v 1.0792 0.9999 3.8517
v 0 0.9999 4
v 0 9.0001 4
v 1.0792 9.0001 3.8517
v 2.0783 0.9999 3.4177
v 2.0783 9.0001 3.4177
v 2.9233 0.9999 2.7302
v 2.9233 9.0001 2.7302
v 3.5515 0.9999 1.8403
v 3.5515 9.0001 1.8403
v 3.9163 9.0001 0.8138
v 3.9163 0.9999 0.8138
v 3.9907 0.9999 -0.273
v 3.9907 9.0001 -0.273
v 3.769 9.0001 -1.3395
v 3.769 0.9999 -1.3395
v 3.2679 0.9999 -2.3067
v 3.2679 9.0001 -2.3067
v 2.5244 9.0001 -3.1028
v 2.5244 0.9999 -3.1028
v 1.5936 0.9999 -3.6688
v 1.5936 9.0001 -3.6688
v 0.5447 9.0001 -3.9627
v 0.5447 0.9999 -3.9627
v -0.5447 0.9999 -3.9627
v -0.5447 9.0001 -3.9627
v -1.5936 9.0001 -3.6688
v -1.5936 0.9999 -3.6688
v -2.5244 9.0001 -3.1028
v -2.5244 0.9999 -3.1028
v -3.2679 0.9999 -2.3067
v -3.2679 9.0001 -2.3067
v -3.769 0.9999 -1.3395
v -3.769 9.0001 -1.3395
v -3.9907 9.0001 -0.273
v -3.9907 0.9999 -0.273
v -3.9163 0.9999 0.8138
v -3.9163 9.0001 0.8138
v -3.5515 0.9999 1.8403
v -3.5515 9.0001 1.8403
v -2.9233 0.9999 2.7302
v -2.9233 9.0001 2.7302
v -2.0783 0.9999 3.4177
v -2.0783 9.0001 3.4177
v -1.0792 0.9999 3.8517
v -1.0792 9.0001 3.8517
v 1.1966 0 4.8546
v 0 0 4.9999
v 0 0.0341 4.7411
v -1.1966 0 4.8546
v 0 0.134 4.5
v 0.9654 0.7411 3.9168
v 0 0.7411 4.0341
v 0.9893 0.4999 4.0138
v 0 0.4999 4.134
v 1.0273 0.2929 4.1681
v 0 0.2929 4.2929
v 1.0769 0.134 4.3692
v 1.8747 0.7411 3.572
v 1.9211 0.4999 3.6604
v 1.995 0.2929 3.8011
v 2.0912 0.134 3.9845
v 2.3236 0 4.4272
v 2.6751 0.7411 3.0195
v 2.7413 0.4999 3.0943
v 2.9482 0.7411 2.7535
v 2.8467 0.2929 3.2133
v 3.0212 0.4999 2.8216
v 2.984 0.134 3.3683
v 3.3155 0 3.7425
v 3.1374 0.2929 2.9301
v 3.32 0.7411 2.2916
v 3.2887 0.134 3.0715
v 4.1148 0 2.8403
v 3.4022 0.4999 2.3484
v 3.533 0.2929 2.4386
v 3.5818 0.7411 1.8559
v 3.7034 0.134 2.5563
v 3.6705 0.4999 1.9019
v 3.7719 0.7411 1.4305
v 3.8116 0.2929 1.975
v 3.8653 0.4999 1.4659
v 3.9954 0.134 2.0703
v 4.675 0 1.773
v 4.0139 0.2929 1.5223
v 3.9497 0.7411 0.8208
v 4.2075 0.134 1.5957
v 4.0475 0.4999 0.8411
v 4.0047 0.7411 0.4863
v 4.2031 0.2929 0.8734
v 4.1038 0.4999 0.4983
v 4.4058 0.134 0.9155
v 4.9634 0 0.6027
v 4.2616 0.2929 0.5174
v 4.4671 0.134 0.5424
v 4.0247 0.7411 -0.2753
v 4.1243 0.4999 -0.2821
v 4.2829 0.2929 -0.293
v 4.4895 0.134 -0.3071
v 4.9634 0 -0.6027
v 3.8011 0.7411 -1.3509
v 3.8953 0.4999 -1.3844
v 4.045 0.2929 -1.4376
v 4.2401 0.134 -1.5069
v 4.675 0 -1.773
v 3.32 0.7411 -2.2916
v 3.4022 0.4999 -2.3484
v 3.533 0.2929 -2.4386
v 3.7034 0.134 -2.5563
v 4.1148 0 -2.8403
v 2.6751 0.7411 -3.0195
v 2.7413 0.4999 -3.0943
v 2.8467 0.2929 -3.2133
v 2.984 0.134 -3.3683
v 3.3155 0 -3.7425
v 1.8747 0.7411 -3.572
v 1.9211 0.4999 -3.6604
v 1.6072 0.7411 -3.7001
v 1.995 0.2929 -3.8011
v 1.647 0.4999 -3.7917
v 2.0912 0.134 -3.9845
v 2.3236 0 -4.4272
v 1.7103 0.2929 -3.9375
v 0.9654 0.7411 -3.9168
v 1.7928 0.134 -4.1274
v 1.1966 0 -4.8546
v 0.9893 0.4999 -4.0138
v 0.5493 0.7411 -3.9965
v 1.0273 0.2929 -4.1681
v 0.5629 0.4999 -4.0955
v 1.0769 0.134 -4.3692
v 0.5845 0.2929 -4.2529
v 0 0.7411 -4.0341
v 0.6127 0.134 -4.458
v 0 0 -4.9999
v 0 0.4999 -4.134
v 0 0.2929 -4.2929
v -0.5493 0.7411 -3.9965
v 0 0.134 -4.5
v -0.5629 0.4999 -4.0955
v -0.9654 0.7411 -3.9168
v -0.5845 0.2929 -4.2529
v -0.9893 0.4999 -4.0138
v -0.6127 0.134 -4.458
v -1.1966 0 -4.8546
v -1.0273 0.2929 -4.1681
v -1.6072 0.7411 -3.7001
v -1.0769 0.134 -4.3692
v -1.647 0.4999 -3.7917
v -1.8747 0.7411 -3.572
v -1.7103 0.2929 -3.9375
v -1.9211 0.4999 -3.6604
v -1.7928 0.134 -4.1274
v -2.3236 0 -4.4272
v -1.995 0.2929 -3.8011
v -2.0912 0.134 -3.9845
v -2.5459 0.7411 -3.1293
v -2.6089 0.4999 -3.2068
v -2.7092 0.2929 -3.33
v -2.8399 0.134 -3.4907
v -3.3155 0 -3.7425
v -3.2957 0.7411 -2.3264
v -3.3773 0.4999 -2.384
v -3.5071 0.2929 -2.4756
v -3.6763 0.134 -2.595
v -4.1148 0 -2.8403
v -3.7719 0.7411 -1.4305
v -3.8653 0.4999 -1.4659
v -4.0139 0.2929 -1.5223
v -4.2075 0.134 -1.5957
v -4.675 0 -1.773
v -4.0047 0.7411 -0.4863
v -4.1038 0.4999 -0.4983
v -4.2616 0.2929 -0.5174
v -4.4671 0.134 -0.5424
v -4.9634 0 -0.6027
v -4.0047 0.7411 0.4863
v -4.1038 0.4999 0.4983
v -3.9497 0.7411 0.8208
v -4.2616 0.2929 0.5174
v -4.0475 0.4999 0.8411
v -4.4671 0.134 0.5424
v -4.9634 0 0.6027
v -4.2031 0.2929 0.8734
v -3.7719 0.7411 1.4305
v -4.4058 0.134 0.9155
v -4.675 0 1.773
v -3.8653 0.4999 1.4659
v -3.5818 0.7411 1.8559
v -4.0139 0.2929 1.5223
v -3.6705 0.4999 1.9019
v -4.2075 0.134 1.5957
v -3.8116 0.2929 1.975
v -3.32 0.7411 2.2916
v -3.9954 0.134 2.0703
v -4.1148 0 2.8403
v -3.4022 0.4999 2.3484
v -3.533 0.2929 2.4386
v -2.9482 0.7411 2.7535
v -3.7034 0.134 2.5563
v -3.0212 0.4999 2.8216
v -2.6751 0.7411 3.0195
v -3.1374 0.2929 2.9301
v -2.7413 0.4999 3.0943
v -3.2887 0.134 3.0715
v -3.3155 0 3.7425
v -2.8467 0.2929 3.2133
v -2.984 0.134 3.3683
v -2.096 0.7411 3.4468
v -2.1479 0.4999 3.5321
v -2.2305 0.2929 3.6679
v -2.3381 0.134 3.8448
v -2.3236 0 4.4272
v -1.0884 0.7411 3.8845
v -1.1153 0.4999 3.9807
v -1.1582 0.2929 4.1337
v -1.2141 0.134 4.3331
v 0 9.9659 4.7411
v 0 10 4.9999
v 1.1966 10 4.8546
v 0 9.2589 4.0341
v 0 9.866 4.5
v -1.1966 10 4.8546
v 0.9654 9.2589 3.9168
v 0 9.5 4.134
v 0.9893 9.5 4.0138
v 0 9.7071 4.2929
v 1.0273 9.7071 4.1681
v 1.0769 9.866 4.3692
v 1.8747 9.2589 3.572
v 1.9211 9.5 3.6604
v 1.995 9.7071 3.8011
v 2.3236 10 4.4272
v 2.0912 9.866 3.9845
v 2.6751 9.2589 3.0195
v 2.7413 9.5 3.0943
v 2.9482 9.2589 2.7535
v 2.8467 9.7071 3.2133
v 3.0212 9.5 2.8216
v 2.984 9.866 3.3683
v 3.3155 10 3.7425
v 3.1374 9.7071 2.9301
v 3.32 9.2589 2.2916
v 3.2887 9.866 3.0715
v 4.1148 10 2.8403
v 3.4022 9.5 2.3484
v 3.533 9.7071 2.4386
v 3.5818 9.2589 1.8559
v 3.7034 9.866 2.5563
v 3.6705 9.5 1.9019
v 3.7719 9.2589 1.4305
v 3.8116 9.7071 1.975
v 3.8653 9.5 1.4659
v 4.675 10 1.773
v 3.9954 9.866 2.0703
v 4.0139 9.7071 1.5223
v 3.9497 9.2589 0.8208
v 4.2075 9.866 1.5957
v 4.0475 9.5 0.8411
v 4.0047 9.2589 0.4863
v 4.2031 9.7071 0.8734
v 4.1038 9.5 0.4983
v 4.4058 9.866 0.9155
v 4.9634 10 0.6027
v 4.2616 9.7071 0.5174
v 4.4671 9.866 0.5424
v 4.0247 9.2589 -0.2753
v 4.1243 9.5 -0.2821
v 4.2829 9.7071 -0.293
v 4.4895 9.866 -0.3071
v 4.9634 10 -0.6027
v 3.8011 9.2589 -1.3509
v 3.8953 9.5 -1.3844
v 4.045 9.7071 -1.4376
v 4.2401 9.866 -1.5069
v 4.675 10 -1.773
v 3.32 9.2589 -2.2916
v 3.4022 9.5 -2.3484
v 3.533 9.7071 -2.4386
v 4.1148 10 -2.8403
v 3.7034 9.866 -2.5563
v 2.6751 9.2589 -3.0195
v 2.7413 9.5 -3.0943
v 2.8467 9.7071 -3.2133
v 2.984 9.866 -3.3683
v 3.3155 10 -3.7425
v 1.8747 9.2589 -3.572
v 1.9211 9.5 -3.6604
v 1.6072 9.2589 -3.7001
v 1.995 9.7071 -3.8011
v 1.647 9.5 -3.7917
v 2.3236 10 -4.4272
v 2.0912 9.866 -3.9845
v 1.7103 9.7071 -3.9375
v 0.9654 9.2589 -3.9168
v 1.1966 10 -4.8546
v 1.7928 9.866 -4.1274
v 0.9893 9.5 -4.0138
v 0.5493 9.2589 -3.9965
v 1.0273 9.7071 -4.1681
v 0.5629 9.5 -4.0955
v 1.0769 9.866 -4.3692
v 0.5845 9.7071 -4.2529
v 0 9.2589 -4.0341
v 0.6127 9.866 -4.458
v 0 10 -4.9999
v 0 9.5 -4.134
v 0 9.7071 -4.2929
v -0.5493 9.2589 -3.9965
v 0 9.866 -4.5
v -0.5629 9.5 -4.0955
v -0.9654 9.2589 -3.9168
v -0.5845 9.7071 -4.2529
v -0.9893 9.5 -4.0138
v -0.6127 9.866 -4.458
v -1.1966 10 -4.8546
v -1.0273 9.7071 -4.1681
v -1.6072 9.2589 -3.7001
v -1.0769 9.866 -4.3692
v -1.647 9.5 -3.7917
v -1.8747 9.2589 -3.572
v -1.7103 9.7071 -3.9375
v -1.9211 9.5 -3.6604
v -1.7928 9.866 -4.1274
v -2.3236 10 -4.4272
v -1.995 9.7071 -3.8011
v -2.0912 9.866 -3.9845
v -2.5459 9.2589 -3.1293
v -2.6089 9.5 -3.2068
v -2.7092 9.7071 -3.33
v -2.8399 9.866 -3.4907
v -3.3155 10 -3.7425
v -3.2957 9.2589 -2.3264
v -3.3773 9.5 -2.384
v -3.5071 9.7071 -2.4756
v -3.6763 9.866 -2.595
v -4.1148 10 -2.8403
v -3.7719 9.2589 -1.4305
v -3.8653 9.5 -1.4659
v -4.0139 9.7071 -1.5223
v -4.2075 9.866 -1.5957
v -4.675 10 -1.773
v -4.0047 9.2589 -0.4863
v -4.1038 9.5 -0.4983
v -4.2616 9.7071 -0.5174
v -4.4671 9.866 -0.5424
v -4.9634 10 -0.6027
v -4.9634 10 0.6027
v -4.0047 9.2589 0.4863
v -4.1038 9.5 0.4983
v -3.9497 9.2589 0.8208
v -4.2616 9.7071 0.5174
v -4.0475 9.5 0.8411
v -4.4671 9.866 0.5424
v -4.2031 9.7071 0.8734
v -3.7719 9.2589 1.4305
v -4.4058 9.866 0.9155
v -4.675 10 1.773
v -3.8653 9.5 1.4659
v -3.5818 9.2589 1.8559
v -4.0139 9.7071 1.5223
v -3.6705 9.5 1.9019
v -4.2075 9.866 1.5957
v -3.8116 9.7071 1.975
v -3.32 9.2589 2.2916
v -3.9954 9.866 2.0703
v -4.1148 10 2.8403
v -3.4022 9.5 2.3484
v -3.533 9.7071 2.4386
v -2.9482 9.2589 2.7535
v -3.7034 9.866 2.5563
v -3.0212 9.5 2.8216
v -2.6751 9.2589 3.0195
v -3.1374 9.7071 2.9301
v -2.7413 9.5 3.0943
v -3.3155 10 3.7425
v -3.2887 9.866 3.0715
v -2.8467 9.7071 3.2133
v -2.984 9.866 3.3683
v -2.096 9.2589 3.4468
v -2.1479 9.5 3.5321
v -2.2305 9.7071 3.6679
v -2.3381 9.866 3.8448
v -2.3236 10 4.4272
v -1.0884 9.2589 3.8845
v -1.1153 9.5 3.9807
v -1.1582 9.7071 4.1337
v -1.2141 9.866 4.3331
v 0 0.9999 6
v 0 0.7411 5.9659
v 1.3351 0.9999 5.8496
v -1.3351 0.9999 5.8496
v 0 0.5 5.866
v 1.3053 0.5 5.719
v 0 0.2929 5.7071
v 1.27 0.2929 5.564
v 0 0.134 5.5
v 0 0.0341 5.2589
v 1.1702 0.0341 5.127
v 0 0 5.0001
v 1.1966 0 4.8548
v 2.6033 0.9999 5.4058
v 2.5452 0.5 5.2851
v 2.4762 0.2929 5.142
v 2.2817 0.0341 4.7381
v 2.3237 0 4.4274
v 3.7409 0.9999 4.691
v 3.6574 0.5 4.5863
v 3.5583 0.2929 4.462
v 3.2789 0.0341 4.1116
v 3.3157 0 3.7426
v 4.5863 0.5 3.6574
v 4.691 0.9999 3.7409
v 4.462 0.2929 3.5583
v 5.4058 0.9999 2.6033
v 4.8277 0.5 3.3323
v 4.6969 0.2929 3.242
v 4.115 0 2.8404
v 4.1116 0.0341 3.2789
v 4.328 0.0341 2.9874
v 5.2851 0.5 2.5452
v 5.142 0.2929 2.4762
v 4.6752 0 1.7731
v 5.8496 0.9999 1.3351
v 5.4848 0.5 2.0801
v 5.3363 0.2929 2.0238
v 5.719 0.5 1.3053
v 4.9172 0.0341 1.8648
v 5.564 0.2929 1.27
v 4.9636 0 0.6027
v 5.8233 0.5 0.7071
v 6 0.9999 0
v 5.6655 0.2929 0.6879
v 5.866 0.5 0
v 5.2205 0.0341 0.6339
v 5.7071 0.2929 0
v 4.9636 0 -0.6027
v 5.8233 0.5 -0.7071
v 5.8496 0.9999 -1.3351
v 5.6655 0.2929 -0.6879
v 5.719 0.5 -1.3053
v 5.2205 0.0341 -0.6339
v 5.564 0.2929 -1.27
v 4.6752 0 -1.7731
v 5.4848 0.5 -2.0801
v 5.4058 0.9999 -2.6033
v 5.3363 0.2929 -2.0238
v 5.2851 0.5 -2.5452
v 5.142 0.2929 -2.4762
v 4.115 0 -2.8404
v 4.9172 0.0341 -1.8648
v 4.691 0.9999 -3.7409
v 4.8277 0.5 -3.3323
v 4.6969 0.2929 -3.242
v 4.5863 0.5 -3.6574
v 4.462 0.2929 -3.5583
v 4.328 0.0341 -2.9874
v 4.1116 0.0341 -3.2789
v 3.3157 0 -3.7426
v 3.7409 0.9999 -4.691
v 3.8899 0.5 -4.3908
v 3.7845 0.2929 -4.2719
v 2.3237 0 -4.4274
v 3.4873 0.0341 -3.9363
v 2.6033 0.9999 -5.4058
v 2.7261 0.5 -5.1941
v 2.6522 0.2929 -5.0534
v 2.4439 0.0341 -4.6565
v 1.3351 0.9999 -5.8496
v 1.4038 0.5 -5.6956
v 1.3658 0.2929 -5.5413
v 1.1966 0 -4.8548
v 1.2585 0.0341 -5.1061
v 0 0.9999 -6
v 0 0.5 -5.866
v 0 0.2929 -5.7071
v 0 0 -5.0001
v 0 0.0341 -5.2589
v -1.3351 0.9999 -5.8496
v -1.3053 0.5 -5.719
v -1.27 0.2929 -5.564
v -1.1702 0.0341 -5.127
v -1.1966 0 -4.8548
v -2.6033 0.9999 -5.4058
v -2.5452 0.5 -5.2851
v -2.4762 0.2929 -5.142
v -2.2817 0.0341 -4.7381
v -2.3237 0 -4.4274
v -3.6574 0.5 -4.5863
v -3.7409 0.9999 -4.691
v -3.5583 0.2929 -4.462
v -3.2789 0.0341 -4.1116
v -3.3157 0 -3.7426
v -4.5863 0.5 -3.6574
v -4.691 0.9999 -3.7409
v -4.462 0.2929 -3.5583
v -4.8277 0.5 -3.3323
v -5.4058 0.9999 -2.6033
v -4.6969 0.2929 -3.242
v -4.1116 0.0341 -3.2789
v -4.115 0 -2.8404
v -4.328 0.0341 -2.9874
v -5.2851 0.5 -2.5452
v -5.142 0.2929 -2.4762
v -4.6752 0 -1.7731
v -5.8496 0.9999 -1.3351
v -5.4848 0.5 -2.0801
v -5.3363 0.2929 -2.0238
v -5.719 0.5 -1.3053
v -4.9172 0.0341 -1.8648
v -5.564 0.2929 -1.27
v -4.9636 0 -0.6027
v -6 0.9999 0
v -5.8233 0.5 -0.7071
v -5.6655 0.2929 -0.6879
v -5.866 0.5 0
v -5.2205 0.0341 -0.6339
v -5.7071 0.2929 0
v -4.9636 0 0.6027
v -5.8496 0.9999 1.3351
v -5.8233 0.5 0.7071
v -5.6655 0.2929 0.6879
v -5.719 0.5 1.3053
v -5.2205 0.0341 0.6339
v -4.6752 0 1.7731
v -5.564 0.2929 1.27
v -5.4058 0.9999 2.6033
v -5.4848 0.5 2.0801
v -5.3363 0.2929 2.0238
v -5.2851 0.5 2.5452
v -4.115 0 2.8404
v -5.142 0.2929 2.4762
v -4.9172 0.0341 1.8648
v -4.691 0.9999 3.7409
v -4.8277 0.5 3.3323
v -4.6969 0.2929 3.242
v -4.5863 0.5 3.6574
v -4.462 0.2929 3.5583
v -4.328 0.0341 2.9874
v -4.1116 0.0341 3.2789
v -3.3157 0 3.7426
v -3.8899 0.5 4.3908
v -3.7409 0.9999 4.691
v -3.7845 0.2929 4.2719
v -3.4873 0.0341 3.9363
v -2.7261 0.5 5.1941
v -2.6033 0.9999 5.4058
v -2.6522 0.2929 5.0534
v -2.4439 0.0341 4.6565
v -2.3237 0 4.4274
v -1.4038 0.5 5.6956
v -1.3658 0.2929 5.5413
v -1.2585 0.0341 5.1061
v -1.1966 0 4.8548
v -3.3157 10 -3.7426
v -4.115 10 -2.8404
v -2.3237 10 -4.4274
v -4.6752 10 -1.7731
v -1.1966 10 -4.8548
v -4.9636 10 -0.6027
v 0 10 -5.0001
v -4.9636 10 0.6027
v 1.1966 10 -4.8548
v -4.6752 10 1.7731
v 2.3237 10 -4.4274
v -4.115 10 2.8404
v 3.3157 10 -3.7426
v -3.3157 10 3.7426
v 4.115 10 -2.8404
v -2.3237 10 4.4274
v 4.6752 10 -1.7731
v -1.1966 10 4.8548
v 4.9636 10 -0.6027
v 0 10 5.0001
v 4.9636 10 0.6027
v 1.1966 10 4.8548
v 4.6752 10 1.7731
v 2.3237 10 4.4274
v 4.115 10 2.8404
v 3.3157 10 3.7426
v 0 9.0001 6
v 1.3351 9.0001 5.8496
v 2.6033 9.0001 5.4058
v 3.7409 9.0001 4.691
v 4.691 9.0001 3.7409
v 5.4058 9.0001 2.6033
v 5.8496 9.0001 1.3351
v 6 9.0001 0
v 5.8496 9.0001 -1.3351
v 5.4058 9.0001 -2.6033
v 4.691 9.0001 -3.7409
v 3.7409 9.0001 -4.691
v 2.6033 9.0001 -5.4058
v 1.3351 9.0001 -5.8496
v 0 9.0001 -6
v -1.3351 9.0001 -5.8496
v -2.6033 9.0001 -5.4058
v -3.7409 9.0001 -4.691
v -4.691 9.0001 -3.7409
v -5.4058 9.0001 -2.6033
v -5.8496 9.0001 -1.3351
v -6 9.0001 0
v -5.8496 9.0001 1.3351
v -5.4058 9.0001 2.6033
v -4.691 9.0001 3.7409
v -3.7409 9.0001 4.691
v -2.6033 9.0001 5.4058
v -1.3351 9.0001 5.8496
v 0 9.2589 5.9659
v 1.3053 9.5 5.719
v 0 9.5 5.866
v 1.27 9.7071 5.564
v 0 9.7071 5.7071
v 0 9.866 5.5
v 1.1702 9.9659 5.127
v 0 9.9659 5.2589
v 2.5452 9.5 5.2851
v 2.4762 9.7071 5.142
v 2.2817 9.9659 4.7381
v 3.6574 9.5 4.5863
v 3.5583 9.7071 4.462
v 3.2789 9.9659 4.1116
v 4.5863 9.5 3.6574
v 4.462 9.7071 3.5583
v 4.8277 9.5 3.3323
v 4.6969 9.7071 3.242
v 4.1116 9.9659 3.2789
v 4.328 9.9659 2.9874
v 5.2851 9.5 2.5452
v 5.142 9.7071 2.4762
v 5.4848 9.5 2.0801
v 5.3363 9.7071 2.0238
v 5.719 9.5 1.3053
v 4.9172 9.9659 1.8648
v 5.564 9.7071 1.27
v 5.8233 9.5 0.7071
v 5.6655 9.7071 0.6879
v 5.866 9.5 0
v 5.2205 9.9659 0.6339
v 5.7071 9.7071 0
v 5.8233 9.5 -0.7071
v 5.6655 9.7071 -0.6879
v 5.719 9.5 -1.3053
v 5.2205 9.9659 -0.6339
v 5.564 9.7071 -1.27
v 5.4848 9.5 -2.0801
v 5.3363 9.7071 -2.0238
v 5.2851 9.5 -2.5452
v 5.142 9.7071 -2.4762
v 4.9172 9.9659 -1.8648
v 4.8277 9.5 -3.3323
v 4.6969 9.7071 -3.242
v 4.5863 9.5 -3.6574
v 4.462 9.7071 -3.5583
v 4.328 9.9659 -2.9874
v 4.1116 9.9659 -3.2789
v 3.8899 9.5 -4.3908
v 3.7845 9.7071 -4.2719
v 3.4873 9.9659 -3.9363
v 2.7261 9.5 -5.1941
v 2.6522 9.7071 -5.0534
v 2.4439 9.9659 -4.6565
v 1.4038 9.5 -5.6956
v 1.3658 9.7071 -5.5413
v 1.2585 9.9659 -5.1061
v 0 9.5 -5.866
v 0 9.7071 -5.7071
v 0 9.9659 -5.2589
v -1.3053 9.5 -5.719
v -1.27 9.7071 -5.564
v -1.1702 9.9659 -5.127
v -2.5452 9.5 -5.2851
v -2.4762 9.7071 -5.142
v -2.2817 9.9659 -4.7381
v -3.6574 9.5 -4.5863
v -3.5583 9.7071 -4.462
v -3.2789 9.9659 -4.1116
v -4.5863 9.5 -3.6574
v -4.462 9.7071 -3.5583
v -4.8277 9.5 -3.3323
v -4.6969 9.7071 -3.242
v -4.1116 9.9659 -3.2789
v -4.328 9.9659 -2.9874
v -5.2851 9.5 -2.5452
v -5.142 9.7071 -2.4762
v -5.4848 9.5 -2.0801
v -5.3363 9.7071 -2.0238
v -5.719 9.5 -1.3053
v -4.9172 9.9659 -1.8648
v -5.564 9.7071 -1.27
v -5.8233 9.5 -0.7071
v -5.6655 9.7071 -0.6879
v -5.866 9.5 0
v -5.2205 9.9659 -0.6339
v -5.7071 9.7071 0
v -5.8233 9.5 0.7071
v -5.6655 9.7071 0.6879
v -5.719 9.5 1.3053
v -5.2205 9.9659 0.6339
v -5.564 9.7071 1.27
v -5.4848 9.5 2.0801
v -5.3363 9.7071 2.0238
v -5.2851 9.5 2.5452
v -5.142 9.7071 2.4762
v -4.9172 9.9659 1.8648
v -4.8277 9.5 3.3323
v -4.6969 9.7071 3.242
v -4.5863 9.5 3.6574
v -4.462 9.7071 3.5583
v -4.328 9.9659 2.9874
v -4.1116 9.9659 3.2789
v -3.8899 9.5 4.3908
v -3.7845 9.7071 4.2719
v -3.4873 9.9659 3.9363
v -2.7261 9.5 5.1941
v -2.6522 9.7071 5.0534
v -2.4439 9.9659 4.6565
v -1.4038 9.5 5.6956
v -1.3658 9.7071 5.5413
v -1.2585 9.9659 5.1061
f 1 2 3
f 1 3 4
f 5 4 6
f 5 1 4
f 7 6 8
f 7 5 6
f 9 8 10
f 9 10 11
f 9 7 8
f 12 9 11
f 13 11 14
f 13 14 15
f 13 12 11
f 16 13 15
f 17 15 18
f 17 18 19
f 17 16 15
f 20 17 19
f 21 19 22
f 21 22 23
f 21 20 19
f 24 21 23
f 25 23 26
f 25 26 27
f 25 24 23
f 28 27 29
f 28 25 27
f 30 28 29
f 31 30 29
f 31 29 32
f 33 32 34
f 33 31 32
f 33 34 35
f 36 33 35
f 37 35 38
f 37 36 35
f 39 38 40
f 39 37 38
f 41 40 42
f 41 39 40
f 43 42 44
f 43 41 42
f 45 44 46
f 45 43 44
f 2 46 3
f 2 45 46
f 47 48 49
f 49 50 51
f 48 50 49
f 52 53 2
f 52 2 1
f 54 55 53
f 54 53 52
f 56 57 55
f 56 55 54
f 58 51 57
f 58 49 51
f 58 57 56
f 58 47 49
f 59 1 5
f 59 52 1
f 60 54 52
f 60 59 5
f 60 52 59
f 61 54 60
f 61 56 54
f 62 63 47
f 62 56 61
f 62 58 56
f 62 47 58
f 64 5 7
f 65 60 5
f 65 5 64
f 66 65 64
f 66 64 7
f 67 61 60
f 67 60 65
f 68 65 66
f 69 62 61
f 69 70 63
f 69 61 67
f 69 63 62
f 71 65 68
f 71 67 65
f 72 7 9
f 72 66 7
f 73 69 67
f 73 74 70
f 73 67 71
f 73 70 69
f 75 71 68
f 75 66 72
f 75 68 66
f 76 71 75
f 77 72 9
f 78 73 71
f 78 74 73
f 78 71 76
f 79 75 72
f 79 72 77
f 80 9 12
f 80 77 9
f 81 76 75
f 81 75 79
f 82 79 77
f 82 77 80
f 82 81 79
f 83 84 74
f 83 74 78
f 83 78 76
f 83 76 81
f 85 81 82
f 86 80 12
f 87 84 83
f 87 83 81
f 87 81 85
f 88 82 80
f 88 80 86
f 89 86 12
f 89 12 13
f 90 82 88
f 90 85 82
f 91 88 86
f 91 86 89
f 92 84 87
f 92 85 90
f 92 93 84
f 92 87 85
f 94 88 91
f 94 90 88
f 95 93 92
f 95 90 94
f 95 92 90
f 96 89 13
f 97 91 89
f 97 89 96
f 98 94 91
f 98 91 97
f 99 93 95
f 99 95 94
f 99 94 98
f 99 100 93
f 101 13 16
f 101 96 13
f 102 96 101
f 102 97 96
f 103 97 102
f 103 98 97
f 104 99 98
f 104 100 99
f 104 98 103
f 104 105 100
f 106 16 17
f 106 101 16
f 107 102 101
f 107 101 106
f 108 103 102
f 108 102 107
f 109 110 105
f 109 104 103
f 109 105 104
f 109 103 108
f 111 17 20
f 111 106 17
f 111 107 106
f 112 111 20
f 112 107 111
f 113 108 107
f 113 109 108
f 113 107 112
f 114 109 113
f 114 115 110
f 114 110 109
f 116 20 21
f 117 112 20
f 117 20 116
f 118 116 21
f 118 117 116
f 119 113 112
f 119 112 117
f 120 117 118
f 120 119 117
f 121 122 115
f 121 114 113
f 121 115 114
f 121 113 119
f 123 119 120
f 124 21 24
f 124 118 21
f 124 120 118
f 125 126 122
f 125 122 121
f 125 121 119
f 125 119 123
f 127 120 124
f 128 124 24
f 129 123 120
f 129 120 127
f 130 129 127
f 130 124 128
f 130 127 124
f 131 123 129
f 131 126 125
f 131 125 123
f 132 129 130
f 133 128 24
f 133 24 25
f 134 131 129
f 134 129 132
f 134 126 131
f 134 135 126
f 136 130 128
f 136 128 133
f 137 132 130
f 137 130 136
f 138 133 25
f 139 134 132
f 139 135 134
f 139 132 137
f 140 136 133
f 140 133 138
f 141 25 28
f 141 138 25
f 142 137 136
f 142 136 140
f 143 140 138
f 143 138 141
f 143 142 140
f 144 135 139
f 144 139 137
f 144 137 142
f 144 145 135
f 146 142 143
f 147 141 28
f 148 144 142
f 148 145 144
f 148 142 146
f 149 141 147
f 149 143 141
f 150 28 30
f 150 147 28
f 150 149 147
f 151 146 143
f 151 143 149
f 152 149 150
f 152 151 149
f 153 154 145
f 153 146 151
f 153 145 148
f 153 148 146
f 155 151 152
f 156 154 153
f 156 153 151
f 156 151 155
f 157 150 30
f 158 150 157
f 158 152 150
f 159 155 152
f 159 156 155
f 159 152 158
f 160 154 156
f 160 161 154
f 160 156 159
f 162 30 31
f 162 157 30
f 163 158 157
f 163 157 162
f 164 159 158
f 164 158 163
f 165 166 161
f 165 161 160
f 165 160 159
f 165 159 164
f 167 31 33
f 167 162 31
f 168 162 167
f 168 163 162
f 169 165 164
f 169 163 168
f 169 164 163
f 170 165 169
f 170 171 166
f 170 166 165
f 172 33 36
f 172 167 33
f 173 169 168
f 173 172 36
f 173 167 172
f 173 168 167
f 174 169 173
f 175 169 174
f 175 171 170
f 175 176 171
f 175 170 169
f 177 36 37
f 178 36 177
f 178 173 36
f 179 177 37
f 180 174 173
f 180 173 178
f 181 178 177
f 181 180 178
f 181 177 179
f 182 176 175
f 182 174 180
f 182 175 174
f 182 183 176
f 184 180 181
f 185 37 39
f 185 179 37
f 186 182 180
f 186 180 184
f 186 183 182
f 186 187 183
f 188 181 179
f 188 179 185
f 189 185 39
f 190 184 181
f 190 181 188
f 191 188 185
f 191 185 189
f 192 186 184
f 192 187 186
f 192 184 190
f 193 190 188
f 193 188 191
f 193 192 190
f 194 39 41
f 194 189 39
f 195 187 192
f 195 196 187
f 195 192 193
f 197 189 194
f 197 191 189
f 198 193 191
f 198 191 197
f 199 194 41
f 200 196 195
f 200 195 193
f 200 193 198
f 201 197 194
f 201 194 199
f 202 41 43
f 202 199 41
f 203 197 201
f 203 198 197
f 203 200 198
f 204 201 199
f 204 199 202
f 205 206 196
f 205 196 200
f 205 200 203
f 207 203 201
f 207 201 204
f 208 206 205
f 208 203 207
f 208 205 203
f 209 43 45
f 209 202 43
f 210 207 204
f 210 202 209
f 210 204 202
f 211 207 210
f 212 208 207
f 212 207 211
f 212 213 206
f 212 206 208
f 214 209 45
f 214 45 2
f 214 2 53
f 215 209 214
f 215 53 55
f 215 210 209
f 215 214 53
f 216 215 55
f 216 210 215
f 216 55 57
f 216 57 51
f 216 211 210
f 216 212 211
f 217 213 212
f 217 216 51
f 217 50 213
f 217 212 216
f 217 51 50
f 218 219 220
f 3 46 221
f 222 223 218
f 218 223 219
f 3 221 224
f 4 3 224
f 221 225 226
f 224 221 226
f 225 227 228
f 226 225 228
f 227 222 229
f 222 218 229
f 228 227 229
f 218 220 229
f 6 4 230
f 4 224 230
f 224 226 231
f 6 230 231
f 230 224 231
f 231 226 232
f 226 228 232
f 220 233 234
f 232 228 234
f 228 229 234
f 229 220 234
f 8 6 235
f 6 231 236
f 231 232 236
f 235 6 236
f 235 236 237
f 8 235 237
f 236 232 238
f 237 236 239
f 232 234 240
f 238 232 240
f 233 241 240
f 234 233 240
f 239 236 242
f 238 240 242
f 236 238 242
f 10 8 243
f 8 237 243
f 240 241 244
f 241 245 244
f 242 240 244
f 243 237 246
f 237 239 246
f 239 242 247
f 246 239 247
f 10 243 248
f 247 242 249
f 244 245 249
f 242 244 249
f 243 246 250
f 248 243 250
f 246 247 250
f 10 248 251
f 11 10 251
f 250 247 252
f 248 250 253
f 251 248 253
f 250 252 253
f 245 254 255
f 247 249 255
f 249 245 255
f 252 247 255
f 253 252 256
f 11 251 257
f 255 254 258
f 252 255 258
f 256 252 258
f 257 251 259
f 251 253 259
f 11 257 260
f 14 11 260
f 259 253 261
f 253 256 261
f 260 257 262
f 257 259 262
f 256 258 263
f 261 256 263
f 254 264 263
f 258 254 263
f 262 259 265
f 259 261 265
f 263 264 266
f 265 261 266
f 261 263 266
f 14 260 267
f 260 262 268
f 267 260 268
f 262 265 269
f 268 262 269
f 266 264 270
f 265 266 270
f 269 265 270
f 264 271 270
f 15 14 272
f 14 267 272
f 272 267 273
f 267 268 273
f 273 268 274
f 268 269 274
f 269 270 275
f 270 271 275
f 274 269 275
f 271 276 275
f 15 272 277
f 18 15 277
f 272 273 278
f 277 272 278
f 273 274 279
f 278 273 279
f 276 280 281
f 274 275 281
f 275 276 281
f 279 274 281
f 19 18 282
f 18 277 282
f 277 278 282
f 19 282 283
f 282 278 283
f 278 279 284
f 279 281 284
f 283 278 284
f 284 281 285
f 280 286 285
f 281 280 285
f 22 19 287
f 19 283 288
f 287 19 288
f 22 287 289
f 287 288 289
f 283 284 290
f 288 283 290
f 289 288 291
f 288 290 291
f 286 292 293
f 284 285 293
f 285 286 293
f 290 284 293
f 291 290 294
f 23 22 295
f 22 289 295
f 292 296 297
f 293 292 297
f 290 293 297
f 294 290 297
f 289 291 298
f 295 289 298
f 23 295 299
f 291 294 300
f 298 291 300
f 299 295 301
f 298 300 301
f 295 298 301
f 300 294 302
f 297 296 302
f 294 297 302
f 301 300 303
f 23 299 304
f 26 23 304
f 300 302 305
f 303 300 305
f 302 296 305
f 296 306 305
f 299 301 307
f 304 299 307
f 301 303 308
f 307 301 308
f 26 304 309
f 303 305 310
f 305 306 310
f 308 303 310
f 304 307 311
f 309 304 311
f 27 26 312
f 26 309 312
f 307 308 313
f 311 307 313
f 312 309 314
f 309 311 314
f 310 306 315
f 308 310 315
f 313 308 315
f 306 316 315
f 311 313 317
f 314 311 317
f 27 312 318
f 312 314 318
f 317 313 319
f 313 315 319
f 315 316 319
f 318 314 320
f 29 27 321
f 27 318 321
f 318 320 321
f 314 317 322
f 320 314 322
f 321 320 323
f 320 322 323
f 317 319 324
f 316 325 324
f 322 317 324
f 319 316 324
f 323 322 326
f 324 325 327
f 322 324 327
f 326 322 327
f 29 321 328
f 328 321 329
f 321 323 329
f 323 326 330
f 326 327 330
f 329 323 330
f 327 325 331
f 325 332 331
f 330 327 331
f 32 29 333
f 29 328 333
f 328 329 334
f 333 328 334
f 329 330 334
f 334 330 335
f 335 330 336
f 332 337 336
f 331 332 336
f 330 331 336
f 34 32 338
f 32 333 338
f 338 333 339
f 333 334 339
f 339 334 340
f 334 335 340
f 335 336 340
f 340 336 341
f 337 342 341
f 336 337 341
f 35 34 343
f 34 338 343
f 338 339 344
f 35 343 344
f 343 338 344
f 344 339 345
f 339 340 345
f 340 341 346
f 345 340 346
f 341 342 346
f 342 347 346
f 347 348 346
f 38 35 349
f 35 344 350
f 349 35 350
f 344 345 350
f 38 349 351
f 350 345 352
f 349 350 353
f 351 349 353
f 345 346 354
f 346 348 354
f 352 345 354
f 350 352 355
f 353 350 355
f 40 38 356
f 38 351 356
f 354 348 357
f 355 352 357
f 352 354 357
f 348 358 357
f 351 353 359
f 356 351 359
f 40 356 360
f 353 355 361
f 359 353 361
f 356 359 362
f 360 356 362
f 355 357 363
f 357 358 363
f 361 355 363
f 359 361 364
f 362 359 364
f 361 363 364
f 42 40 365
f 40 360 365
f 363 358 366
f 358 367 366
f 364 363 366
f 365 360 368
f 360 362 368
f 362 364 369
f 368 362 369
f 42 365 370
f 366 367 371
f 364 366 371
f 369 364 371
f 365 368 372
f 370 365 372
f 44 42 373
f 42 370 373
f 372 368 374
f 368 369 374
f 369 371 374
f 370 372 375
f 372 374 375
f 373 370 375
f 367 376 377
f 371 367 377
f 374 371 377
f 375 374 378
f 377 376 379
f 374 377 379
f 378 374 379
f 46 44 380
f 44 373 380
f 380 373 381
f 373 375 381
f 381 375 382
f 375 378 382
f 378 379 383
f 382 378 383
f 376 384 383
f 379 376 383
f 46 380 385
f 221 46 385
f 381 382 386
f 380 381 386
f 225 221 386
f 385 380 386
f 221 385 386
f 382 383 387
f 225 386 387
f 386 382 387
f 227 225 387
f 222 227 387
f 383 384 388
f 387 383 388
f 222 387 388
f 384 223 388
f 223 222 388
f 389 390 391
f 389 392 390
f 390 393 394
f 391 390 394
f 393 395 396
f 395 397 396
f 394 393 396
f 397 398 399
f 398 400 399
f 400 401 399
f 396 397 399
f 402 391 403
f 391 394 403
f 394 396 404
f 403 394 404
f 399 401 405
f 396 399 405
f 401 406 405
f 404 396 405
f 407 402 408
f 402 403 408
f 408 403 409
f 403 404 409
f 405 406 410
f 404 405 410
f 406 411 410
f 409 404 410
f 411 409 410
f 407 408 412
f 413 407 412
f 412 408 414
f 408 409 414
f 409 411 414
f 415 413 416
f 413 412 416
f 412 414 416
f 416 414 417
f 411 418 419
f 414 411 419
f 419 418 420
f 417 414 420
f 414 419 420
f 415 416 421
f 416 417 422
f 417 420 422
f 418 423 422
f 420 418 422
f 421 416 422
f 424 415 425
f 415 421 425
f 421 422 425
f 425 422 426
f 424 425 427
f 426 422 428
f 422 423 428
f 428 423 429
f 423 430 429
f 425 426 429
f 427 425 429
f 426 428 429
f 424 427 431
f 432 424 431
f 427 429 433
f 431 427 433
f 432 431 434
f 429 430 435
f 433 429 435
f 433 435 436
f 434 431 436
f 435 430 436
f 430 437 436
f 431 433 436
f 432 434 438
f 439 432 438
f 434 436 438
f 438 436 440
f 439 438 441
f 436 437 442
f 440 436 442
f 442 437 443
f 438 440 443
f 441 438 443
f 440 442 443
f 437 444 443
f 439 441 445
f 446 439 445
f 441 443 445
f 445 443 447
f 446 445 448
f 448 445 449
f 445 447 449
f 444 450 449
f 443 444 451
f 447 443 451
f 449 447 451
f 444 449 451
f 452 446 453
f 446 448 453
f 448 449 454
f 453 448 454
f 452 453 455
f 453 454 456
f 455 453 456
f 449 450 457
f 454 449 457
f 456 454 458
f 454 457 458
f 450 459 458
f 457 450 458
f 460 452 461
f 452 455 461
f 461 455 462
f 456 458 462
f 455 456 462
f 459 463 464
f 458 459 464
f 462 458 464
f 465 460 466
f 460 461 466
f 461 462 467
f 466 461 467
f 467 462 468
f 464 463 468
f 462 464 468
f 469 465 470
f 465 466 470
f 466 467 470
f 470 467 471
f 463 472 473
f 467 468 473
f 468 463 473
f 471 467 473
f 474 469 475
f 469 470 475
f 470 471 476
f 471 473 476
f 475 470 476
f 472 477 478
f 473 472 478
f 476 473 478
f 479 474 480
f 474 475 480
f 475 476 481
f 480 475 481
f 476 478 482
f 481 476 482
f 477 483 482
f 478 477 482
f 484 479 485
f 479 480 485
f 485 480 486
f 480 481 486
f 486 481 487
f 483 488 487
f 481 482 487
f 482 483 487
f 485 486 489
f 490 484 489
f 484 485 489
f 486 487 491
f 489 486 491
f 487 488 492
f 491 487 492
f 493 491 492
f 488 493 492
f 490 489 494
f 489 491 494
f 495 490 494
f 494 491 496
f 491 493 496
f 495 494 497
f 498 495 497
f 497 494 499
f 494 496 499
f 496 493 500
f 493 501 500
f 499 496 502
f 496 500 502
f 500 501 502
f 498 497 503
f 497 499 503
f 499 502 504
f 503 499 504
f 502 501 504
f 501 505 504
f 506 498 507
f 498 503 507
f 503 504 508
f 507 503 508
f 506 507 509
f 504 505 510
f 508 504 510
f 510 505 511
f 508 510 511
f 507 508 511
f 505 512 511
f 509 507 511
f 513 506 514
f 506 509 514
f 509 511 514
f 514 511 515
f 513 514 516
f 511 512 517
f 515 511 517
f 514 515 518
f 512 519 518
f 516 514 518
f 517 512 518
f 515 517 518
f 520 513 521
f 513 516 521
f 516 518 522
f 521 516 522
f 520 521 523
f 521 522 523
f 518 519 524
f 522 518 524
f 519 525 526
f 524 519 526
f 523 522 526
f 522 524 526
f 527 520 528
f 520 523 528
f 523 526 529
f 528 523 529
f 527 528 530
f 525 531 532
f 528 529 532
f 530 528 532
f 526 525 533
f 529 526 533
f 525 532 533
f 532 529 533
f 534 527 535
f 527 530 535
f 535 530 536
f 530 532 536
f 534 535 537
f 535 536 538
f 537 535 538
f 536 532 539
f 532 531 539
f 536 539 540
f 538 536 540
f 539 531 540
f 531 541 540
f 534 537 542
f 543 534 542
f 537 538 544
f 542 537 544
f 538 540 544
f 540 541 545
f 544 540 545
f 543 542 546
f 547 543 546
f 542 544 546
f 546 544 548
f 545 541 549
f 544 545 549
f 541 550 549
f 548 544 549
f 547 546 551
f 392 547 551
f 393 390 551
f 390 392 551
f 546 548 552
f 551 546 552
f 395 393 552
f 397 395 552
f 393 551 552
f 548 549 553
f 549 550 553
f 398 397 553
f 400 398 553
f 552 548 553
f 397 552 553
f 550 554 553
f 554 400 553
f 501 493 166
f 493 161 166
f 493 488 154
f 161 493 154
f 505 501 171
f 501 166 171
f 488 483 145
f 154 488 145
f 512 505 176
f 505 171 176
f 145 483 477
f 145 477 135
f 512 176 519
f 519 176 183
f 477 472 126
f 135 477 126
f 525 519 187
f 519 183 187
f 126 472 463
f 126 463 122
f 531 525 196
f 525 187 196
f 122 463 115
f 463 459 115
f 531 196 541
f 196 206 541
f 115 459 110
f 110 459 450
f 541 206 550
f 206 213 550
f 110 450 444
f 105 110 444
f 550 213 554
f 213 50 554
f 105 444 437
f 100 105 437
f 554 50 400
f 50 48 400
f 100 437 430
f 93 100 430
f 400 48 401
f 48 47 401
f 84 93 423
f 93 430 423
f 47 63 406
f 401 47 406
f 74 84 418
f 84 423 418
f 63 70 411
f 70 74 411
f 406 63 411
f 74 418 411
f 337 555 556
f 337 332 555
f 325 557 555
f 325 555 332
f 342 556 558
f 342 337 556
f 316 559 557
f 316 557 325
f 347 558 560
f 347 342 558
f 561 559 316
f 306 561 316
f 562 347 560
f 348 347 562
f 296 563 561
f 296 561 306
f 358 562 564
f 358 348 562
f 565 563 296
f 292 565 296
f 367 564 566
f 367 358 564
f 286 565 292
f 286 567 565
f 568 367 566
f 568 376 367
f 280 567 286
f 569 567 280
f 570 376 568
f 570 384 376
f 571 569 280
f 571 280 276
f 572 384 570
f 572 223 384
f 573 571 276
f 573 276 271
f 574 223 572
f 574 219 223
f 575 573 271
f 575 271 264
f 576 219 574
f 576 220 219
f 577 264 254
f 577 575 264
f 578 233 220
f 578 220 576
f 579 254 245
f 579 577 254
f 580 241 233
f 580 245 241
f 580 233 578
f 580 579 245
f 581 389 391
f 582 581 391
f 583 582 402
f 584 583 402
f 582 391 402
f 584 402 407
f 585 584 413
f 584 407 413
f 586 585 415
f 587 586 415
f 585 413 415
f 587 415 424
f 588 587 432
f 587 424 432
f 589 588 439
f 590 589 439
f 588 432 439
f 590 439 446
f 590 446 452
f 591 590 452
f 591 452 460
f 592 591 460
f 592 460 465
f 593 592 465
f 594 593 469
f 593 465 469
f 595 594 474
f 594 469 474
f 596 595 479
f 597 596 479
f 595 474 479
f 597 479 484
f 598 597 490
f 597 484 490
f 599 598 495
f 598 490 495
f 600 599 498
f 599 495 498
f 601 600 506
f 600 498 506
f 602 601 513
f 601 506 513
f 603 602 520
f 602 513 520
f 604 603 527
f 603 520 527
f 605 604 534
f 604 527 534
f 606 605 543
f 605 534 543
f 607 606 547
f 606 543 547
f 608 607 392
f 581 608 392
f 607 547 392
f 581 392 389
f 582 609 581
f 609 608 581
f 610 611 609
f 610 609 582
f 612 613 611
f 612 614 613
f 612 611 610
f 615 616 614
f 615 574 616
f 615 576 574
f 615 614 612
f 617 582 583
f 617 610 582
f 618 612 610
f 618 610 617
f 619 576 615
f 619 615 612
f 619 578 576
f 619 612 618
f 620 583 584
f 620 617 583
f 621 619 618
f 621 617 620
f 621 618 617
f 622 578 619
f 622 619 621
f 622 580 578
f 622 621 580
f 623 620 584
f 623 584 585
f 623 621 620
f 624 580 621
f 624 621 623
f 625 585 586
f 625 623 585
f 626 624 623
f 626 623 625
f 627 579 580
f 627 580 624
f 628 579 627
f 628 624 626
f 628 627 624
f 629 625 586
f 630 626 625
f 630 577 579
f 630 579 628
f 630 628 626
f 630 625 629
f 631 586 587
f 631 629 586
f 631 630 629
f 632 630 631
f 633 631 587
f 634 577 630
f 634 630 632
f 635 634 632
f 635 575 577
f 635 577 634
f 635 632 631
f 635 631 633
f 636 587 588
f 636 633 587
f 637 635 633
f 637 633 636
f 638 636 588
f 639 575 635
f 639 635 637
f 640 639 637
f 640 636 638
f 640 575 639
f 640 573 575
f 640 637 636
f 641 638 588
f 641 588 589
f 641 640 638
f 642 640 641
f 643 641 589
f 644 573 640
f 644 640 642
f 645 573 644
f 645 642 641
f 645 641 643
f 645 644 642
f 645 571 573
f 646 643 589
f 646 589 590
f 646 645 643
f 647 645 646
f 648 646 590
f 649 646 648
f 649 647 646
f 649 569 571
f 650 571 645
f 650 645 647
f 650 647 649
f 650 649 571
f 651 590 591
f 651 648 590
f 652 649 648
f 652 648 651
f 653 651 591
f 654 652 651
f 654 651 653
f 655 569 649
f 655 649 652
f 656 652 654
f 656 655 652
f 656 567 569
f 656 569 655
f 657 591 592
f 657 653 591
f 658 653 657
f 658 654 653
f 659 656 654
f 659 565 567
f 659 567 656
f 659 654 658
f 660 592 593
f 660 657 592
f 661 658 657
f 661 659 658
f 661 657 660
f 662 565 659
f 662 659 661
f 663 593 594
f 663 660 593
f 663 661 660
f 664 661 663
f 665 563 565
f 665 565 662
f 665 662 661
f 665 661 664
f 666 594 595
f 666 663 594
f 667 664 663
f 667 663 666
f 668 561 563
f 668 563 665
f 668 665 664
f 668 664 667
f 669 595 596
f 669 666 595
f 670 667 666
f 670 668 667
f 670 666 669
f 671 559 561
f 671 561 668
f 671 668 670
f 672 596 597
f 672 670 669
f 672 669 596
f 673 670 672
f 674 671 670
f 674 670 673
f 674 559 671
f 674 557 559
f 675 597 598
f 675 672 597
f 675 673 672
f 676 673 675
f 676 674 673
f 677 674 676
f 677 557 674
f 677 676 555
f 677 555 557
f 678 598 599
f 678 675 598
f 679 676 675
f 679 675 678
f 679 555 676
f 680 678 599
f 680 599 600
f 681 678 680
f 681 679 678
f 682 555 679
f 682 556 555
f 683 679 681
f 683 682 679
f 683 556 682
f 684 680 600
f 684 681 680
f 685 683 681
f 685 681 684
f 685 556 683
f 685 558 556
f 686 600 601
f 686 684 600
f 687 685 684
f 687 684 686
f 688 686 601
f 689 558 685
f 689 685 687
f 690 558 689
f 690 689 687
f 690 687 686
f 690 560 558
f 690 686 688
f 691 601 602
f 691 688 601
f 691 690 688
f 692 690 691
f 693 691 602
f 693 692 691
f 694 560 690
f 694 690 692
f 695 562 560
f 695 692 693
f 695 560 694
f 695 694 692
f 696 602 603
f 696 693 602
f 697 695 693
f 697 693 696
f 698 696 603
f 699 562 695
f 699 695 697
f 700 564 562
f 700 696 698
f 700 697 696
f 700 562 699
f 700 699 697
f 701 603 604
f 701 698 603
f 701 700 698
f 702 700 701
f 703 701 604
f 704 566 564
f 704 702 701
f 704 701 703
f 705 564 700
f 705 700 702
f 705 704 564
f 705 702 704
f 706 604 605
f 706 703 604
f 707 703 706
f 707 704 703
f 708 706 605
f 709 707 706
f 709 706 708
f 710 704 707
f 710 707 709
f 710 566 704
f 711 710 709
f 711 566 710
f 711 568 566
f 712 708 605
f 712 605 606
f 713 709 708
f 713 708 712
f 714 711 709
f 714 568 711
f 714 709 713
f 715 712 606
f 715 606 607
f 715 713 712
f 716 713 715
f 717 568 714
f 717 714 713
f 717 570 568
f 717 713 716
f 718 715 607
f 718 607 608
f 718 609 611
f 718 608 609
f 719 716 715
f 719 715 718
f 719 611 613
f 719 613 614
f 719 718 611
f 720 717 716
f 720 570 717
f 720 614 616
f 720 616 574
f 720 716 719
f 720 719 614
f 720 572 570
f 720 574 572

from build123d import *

# Parameters (mm, degrees)
SKETCH_1_R      = 6
SKETCH_1_R_2    = 4
EXTRUDE_1_DEPTH = 10
FILLET_1_R      = 1


with BuildPart() as part:
    # Эскиз1 → Бобышка-Вытянуть1 (new body)
    with BuildSketch(Plane(origin=(0, 0, 0), x_dir=(1, 0, 0), z_dir=(0, 1, 0))):
        with Locations(Location((0, 0, 0), (0, 0, 270))):
            Circle(SKETCH_1_R)
        with Locations(Location((0, 0, 0), (0, 0, 270))):
            Circle(SKETCH_1_R_2, mode=Mode.SUBTRACT)
    extrude(amount=EXTRUDE_1_DEPTH)

    # 圆角1
    fillet_1_edges = [part.edges().sort_by_distance(p)[0] for p in [
        (0, 0, -6),
        (0, 10, -6),
        (0, 0, -4),
        (0, 10, -4),
    ]]
    fillet(fillet_1_edges, radius=FILLET_1_R - 0.0001)  # a hair under: the kernel refuses the full size


solid = part.part
